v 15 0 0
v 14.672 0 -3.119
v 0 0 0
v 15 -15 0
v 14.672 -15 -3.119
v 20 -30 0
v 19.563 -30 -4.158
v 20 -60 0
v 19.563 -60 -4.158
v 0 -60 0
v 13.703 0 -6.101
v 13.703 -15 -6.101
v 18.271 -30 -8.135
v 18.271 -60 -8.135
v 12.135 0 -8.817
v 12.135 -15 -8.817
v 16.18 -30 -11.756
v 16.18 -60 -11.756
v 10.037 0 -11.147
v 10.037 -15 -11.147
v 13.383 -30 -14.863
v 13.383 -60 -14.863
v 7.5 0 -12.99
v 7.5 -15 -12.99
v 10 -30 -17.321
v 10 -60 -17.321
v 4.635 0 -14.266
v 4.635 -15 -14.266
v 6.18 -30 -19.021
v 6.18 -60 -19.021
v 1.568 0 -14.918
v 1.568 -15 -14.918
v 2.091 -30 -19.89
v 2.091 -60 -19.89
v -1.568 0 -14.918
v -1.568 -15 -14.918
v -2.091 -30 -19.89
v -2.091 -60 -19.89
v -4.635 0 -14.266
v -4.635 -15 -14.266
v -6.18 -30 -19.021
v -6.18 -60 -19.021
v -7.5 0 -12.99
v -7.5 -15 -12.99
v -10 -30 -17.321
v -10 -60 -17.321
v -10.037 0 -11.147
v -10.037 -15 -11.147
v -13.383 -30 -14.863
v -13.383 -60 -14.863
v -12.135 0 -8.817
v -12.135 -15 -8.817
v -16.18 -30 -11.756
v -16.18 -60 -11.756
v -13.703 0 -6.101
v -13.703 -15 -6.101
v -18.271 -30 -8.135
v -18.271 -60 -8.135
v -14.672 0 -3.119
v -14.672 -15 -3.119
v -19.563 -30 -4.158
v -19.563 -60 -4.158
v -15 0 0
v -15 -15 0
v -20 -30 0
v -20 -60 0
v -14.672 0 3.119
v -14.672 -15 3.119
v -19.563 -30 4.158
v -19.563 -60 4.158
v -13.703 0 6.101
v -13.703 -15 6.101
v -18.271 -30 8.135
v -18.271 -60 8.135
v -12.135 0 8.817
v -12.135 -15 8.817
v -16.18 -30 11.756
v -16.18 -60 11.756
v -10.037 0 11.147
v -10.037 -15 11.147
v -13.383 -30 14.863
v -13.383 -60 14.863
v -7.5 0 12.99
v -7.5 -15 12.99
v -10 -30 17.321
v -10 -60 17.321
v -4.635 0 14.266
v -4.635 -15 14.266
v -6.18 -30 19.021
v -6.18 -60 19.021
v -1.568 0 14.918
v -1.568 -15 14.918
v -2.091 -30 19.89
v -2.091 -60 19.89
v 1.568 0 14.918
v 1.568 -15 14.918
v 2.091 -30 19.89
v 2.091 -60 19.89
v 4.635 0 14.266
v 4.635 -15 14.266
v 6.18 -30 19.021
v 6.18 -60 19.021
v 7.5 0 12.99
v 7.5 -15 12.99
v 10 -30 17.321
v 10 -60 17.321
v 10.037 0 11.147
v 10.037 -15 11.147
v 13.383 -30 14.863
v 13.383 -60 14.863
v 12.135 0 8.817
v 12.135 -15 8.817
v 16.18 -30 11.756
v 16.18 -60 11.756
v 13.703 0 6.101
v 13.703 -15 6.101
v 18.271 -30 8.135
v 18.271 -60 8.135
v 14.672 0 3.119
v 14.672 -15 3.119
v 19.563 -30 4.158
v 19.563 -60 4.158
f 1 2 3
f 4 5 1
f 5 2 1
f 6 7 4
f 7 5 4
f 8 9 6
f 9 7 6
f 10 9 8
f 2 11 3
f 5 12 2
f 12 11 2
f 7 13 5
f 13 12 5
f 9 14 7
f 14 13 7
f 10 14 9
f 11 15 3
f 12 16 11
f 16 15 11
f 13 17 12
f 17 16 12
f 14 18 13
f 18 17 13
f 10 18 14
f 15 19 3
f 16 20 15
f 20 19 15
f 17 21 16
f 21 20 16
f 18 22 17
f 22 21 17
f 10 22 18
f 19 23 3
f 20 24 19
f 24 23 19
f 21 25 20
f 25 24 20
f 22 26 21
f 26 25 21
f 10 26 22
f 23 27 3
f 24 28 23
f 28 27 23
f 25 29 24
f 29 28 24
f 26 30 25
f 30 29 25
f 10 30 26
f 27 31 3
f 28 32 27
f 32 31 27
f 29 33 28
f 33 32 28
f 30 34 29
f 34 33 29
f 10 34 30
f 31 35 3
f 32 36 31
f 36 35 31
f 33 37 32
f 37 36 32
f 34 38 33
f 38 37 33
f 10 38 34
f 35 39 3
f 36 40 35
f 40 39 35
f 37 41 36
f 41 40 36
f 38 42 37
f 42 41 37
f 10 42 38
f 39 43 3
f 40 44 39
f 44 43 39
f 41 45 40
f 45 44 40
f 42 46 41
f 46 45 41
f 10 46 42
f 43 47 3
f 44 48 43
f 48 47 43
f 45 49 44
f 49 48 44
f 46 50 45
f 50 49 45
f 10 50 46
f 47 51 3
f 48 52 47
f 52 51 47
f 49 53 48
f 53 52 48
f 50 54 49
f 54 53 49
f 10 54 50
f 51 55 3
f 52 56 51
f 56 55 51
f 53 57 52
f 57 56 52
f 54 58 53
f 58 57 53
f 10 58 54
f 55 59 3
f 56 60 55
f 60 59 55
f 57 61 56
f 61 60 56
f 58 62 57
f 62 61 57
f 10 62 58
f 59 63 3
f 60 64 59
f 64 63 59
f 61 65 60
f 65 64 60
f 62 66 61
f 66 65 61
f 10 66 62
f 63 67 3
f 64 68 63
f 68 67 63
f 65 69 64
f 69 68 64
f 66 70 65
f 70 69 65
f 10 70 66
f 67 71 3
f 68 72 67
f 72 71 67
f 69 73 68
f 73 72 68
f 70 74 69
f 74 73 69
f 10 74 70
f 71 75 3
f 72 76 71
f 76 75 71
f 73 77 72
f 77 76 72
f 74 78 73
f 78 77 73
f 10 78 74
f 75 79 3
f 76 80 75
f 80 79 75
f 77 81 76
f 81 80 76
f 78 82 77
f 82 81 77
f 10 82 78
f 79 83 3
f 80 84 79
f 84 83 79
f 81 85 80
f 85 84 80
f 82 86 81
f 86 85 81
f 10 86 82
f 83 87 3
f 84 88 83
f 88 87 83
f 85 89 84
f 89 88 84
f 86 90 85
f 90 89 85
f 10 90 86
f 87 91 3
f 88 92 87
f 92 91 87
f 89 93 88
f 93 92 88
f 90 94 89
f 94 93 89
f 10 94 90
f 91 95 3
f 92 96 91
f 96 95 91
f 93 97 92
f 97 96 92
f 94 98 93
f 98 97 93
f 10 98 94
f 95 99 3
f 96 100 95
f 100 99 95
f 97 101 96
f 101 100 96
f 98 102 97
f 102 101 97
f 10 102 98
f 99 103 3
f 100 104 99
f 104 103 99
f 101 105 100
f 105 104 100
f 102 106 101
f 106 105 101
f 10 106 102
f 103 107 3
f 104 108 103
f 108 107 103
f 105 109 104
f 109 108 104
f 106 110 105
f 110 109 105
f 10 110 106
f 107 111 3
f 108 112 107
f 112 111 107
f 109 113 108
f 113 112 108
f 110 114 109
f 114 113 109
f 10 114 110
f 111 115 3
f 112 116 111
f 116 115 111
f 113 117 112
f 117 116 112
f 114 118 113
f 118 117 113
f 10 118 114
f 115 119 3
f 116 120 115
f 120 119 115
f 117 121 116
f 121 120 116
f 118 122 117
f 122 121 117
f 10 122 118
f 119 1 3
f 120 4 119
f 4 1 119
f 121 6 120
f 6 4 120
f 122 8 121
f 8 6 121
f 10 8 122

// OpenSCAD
color("gray")
// translate([-1,0,-1])
 rotate([90,0,0])
rotate_extrude(angle = 360)
rotate([0,0,90])


 polygon(points=[[0,0],[60,0],[60,20],[30,20],[15,15],[0,15]]);


 
